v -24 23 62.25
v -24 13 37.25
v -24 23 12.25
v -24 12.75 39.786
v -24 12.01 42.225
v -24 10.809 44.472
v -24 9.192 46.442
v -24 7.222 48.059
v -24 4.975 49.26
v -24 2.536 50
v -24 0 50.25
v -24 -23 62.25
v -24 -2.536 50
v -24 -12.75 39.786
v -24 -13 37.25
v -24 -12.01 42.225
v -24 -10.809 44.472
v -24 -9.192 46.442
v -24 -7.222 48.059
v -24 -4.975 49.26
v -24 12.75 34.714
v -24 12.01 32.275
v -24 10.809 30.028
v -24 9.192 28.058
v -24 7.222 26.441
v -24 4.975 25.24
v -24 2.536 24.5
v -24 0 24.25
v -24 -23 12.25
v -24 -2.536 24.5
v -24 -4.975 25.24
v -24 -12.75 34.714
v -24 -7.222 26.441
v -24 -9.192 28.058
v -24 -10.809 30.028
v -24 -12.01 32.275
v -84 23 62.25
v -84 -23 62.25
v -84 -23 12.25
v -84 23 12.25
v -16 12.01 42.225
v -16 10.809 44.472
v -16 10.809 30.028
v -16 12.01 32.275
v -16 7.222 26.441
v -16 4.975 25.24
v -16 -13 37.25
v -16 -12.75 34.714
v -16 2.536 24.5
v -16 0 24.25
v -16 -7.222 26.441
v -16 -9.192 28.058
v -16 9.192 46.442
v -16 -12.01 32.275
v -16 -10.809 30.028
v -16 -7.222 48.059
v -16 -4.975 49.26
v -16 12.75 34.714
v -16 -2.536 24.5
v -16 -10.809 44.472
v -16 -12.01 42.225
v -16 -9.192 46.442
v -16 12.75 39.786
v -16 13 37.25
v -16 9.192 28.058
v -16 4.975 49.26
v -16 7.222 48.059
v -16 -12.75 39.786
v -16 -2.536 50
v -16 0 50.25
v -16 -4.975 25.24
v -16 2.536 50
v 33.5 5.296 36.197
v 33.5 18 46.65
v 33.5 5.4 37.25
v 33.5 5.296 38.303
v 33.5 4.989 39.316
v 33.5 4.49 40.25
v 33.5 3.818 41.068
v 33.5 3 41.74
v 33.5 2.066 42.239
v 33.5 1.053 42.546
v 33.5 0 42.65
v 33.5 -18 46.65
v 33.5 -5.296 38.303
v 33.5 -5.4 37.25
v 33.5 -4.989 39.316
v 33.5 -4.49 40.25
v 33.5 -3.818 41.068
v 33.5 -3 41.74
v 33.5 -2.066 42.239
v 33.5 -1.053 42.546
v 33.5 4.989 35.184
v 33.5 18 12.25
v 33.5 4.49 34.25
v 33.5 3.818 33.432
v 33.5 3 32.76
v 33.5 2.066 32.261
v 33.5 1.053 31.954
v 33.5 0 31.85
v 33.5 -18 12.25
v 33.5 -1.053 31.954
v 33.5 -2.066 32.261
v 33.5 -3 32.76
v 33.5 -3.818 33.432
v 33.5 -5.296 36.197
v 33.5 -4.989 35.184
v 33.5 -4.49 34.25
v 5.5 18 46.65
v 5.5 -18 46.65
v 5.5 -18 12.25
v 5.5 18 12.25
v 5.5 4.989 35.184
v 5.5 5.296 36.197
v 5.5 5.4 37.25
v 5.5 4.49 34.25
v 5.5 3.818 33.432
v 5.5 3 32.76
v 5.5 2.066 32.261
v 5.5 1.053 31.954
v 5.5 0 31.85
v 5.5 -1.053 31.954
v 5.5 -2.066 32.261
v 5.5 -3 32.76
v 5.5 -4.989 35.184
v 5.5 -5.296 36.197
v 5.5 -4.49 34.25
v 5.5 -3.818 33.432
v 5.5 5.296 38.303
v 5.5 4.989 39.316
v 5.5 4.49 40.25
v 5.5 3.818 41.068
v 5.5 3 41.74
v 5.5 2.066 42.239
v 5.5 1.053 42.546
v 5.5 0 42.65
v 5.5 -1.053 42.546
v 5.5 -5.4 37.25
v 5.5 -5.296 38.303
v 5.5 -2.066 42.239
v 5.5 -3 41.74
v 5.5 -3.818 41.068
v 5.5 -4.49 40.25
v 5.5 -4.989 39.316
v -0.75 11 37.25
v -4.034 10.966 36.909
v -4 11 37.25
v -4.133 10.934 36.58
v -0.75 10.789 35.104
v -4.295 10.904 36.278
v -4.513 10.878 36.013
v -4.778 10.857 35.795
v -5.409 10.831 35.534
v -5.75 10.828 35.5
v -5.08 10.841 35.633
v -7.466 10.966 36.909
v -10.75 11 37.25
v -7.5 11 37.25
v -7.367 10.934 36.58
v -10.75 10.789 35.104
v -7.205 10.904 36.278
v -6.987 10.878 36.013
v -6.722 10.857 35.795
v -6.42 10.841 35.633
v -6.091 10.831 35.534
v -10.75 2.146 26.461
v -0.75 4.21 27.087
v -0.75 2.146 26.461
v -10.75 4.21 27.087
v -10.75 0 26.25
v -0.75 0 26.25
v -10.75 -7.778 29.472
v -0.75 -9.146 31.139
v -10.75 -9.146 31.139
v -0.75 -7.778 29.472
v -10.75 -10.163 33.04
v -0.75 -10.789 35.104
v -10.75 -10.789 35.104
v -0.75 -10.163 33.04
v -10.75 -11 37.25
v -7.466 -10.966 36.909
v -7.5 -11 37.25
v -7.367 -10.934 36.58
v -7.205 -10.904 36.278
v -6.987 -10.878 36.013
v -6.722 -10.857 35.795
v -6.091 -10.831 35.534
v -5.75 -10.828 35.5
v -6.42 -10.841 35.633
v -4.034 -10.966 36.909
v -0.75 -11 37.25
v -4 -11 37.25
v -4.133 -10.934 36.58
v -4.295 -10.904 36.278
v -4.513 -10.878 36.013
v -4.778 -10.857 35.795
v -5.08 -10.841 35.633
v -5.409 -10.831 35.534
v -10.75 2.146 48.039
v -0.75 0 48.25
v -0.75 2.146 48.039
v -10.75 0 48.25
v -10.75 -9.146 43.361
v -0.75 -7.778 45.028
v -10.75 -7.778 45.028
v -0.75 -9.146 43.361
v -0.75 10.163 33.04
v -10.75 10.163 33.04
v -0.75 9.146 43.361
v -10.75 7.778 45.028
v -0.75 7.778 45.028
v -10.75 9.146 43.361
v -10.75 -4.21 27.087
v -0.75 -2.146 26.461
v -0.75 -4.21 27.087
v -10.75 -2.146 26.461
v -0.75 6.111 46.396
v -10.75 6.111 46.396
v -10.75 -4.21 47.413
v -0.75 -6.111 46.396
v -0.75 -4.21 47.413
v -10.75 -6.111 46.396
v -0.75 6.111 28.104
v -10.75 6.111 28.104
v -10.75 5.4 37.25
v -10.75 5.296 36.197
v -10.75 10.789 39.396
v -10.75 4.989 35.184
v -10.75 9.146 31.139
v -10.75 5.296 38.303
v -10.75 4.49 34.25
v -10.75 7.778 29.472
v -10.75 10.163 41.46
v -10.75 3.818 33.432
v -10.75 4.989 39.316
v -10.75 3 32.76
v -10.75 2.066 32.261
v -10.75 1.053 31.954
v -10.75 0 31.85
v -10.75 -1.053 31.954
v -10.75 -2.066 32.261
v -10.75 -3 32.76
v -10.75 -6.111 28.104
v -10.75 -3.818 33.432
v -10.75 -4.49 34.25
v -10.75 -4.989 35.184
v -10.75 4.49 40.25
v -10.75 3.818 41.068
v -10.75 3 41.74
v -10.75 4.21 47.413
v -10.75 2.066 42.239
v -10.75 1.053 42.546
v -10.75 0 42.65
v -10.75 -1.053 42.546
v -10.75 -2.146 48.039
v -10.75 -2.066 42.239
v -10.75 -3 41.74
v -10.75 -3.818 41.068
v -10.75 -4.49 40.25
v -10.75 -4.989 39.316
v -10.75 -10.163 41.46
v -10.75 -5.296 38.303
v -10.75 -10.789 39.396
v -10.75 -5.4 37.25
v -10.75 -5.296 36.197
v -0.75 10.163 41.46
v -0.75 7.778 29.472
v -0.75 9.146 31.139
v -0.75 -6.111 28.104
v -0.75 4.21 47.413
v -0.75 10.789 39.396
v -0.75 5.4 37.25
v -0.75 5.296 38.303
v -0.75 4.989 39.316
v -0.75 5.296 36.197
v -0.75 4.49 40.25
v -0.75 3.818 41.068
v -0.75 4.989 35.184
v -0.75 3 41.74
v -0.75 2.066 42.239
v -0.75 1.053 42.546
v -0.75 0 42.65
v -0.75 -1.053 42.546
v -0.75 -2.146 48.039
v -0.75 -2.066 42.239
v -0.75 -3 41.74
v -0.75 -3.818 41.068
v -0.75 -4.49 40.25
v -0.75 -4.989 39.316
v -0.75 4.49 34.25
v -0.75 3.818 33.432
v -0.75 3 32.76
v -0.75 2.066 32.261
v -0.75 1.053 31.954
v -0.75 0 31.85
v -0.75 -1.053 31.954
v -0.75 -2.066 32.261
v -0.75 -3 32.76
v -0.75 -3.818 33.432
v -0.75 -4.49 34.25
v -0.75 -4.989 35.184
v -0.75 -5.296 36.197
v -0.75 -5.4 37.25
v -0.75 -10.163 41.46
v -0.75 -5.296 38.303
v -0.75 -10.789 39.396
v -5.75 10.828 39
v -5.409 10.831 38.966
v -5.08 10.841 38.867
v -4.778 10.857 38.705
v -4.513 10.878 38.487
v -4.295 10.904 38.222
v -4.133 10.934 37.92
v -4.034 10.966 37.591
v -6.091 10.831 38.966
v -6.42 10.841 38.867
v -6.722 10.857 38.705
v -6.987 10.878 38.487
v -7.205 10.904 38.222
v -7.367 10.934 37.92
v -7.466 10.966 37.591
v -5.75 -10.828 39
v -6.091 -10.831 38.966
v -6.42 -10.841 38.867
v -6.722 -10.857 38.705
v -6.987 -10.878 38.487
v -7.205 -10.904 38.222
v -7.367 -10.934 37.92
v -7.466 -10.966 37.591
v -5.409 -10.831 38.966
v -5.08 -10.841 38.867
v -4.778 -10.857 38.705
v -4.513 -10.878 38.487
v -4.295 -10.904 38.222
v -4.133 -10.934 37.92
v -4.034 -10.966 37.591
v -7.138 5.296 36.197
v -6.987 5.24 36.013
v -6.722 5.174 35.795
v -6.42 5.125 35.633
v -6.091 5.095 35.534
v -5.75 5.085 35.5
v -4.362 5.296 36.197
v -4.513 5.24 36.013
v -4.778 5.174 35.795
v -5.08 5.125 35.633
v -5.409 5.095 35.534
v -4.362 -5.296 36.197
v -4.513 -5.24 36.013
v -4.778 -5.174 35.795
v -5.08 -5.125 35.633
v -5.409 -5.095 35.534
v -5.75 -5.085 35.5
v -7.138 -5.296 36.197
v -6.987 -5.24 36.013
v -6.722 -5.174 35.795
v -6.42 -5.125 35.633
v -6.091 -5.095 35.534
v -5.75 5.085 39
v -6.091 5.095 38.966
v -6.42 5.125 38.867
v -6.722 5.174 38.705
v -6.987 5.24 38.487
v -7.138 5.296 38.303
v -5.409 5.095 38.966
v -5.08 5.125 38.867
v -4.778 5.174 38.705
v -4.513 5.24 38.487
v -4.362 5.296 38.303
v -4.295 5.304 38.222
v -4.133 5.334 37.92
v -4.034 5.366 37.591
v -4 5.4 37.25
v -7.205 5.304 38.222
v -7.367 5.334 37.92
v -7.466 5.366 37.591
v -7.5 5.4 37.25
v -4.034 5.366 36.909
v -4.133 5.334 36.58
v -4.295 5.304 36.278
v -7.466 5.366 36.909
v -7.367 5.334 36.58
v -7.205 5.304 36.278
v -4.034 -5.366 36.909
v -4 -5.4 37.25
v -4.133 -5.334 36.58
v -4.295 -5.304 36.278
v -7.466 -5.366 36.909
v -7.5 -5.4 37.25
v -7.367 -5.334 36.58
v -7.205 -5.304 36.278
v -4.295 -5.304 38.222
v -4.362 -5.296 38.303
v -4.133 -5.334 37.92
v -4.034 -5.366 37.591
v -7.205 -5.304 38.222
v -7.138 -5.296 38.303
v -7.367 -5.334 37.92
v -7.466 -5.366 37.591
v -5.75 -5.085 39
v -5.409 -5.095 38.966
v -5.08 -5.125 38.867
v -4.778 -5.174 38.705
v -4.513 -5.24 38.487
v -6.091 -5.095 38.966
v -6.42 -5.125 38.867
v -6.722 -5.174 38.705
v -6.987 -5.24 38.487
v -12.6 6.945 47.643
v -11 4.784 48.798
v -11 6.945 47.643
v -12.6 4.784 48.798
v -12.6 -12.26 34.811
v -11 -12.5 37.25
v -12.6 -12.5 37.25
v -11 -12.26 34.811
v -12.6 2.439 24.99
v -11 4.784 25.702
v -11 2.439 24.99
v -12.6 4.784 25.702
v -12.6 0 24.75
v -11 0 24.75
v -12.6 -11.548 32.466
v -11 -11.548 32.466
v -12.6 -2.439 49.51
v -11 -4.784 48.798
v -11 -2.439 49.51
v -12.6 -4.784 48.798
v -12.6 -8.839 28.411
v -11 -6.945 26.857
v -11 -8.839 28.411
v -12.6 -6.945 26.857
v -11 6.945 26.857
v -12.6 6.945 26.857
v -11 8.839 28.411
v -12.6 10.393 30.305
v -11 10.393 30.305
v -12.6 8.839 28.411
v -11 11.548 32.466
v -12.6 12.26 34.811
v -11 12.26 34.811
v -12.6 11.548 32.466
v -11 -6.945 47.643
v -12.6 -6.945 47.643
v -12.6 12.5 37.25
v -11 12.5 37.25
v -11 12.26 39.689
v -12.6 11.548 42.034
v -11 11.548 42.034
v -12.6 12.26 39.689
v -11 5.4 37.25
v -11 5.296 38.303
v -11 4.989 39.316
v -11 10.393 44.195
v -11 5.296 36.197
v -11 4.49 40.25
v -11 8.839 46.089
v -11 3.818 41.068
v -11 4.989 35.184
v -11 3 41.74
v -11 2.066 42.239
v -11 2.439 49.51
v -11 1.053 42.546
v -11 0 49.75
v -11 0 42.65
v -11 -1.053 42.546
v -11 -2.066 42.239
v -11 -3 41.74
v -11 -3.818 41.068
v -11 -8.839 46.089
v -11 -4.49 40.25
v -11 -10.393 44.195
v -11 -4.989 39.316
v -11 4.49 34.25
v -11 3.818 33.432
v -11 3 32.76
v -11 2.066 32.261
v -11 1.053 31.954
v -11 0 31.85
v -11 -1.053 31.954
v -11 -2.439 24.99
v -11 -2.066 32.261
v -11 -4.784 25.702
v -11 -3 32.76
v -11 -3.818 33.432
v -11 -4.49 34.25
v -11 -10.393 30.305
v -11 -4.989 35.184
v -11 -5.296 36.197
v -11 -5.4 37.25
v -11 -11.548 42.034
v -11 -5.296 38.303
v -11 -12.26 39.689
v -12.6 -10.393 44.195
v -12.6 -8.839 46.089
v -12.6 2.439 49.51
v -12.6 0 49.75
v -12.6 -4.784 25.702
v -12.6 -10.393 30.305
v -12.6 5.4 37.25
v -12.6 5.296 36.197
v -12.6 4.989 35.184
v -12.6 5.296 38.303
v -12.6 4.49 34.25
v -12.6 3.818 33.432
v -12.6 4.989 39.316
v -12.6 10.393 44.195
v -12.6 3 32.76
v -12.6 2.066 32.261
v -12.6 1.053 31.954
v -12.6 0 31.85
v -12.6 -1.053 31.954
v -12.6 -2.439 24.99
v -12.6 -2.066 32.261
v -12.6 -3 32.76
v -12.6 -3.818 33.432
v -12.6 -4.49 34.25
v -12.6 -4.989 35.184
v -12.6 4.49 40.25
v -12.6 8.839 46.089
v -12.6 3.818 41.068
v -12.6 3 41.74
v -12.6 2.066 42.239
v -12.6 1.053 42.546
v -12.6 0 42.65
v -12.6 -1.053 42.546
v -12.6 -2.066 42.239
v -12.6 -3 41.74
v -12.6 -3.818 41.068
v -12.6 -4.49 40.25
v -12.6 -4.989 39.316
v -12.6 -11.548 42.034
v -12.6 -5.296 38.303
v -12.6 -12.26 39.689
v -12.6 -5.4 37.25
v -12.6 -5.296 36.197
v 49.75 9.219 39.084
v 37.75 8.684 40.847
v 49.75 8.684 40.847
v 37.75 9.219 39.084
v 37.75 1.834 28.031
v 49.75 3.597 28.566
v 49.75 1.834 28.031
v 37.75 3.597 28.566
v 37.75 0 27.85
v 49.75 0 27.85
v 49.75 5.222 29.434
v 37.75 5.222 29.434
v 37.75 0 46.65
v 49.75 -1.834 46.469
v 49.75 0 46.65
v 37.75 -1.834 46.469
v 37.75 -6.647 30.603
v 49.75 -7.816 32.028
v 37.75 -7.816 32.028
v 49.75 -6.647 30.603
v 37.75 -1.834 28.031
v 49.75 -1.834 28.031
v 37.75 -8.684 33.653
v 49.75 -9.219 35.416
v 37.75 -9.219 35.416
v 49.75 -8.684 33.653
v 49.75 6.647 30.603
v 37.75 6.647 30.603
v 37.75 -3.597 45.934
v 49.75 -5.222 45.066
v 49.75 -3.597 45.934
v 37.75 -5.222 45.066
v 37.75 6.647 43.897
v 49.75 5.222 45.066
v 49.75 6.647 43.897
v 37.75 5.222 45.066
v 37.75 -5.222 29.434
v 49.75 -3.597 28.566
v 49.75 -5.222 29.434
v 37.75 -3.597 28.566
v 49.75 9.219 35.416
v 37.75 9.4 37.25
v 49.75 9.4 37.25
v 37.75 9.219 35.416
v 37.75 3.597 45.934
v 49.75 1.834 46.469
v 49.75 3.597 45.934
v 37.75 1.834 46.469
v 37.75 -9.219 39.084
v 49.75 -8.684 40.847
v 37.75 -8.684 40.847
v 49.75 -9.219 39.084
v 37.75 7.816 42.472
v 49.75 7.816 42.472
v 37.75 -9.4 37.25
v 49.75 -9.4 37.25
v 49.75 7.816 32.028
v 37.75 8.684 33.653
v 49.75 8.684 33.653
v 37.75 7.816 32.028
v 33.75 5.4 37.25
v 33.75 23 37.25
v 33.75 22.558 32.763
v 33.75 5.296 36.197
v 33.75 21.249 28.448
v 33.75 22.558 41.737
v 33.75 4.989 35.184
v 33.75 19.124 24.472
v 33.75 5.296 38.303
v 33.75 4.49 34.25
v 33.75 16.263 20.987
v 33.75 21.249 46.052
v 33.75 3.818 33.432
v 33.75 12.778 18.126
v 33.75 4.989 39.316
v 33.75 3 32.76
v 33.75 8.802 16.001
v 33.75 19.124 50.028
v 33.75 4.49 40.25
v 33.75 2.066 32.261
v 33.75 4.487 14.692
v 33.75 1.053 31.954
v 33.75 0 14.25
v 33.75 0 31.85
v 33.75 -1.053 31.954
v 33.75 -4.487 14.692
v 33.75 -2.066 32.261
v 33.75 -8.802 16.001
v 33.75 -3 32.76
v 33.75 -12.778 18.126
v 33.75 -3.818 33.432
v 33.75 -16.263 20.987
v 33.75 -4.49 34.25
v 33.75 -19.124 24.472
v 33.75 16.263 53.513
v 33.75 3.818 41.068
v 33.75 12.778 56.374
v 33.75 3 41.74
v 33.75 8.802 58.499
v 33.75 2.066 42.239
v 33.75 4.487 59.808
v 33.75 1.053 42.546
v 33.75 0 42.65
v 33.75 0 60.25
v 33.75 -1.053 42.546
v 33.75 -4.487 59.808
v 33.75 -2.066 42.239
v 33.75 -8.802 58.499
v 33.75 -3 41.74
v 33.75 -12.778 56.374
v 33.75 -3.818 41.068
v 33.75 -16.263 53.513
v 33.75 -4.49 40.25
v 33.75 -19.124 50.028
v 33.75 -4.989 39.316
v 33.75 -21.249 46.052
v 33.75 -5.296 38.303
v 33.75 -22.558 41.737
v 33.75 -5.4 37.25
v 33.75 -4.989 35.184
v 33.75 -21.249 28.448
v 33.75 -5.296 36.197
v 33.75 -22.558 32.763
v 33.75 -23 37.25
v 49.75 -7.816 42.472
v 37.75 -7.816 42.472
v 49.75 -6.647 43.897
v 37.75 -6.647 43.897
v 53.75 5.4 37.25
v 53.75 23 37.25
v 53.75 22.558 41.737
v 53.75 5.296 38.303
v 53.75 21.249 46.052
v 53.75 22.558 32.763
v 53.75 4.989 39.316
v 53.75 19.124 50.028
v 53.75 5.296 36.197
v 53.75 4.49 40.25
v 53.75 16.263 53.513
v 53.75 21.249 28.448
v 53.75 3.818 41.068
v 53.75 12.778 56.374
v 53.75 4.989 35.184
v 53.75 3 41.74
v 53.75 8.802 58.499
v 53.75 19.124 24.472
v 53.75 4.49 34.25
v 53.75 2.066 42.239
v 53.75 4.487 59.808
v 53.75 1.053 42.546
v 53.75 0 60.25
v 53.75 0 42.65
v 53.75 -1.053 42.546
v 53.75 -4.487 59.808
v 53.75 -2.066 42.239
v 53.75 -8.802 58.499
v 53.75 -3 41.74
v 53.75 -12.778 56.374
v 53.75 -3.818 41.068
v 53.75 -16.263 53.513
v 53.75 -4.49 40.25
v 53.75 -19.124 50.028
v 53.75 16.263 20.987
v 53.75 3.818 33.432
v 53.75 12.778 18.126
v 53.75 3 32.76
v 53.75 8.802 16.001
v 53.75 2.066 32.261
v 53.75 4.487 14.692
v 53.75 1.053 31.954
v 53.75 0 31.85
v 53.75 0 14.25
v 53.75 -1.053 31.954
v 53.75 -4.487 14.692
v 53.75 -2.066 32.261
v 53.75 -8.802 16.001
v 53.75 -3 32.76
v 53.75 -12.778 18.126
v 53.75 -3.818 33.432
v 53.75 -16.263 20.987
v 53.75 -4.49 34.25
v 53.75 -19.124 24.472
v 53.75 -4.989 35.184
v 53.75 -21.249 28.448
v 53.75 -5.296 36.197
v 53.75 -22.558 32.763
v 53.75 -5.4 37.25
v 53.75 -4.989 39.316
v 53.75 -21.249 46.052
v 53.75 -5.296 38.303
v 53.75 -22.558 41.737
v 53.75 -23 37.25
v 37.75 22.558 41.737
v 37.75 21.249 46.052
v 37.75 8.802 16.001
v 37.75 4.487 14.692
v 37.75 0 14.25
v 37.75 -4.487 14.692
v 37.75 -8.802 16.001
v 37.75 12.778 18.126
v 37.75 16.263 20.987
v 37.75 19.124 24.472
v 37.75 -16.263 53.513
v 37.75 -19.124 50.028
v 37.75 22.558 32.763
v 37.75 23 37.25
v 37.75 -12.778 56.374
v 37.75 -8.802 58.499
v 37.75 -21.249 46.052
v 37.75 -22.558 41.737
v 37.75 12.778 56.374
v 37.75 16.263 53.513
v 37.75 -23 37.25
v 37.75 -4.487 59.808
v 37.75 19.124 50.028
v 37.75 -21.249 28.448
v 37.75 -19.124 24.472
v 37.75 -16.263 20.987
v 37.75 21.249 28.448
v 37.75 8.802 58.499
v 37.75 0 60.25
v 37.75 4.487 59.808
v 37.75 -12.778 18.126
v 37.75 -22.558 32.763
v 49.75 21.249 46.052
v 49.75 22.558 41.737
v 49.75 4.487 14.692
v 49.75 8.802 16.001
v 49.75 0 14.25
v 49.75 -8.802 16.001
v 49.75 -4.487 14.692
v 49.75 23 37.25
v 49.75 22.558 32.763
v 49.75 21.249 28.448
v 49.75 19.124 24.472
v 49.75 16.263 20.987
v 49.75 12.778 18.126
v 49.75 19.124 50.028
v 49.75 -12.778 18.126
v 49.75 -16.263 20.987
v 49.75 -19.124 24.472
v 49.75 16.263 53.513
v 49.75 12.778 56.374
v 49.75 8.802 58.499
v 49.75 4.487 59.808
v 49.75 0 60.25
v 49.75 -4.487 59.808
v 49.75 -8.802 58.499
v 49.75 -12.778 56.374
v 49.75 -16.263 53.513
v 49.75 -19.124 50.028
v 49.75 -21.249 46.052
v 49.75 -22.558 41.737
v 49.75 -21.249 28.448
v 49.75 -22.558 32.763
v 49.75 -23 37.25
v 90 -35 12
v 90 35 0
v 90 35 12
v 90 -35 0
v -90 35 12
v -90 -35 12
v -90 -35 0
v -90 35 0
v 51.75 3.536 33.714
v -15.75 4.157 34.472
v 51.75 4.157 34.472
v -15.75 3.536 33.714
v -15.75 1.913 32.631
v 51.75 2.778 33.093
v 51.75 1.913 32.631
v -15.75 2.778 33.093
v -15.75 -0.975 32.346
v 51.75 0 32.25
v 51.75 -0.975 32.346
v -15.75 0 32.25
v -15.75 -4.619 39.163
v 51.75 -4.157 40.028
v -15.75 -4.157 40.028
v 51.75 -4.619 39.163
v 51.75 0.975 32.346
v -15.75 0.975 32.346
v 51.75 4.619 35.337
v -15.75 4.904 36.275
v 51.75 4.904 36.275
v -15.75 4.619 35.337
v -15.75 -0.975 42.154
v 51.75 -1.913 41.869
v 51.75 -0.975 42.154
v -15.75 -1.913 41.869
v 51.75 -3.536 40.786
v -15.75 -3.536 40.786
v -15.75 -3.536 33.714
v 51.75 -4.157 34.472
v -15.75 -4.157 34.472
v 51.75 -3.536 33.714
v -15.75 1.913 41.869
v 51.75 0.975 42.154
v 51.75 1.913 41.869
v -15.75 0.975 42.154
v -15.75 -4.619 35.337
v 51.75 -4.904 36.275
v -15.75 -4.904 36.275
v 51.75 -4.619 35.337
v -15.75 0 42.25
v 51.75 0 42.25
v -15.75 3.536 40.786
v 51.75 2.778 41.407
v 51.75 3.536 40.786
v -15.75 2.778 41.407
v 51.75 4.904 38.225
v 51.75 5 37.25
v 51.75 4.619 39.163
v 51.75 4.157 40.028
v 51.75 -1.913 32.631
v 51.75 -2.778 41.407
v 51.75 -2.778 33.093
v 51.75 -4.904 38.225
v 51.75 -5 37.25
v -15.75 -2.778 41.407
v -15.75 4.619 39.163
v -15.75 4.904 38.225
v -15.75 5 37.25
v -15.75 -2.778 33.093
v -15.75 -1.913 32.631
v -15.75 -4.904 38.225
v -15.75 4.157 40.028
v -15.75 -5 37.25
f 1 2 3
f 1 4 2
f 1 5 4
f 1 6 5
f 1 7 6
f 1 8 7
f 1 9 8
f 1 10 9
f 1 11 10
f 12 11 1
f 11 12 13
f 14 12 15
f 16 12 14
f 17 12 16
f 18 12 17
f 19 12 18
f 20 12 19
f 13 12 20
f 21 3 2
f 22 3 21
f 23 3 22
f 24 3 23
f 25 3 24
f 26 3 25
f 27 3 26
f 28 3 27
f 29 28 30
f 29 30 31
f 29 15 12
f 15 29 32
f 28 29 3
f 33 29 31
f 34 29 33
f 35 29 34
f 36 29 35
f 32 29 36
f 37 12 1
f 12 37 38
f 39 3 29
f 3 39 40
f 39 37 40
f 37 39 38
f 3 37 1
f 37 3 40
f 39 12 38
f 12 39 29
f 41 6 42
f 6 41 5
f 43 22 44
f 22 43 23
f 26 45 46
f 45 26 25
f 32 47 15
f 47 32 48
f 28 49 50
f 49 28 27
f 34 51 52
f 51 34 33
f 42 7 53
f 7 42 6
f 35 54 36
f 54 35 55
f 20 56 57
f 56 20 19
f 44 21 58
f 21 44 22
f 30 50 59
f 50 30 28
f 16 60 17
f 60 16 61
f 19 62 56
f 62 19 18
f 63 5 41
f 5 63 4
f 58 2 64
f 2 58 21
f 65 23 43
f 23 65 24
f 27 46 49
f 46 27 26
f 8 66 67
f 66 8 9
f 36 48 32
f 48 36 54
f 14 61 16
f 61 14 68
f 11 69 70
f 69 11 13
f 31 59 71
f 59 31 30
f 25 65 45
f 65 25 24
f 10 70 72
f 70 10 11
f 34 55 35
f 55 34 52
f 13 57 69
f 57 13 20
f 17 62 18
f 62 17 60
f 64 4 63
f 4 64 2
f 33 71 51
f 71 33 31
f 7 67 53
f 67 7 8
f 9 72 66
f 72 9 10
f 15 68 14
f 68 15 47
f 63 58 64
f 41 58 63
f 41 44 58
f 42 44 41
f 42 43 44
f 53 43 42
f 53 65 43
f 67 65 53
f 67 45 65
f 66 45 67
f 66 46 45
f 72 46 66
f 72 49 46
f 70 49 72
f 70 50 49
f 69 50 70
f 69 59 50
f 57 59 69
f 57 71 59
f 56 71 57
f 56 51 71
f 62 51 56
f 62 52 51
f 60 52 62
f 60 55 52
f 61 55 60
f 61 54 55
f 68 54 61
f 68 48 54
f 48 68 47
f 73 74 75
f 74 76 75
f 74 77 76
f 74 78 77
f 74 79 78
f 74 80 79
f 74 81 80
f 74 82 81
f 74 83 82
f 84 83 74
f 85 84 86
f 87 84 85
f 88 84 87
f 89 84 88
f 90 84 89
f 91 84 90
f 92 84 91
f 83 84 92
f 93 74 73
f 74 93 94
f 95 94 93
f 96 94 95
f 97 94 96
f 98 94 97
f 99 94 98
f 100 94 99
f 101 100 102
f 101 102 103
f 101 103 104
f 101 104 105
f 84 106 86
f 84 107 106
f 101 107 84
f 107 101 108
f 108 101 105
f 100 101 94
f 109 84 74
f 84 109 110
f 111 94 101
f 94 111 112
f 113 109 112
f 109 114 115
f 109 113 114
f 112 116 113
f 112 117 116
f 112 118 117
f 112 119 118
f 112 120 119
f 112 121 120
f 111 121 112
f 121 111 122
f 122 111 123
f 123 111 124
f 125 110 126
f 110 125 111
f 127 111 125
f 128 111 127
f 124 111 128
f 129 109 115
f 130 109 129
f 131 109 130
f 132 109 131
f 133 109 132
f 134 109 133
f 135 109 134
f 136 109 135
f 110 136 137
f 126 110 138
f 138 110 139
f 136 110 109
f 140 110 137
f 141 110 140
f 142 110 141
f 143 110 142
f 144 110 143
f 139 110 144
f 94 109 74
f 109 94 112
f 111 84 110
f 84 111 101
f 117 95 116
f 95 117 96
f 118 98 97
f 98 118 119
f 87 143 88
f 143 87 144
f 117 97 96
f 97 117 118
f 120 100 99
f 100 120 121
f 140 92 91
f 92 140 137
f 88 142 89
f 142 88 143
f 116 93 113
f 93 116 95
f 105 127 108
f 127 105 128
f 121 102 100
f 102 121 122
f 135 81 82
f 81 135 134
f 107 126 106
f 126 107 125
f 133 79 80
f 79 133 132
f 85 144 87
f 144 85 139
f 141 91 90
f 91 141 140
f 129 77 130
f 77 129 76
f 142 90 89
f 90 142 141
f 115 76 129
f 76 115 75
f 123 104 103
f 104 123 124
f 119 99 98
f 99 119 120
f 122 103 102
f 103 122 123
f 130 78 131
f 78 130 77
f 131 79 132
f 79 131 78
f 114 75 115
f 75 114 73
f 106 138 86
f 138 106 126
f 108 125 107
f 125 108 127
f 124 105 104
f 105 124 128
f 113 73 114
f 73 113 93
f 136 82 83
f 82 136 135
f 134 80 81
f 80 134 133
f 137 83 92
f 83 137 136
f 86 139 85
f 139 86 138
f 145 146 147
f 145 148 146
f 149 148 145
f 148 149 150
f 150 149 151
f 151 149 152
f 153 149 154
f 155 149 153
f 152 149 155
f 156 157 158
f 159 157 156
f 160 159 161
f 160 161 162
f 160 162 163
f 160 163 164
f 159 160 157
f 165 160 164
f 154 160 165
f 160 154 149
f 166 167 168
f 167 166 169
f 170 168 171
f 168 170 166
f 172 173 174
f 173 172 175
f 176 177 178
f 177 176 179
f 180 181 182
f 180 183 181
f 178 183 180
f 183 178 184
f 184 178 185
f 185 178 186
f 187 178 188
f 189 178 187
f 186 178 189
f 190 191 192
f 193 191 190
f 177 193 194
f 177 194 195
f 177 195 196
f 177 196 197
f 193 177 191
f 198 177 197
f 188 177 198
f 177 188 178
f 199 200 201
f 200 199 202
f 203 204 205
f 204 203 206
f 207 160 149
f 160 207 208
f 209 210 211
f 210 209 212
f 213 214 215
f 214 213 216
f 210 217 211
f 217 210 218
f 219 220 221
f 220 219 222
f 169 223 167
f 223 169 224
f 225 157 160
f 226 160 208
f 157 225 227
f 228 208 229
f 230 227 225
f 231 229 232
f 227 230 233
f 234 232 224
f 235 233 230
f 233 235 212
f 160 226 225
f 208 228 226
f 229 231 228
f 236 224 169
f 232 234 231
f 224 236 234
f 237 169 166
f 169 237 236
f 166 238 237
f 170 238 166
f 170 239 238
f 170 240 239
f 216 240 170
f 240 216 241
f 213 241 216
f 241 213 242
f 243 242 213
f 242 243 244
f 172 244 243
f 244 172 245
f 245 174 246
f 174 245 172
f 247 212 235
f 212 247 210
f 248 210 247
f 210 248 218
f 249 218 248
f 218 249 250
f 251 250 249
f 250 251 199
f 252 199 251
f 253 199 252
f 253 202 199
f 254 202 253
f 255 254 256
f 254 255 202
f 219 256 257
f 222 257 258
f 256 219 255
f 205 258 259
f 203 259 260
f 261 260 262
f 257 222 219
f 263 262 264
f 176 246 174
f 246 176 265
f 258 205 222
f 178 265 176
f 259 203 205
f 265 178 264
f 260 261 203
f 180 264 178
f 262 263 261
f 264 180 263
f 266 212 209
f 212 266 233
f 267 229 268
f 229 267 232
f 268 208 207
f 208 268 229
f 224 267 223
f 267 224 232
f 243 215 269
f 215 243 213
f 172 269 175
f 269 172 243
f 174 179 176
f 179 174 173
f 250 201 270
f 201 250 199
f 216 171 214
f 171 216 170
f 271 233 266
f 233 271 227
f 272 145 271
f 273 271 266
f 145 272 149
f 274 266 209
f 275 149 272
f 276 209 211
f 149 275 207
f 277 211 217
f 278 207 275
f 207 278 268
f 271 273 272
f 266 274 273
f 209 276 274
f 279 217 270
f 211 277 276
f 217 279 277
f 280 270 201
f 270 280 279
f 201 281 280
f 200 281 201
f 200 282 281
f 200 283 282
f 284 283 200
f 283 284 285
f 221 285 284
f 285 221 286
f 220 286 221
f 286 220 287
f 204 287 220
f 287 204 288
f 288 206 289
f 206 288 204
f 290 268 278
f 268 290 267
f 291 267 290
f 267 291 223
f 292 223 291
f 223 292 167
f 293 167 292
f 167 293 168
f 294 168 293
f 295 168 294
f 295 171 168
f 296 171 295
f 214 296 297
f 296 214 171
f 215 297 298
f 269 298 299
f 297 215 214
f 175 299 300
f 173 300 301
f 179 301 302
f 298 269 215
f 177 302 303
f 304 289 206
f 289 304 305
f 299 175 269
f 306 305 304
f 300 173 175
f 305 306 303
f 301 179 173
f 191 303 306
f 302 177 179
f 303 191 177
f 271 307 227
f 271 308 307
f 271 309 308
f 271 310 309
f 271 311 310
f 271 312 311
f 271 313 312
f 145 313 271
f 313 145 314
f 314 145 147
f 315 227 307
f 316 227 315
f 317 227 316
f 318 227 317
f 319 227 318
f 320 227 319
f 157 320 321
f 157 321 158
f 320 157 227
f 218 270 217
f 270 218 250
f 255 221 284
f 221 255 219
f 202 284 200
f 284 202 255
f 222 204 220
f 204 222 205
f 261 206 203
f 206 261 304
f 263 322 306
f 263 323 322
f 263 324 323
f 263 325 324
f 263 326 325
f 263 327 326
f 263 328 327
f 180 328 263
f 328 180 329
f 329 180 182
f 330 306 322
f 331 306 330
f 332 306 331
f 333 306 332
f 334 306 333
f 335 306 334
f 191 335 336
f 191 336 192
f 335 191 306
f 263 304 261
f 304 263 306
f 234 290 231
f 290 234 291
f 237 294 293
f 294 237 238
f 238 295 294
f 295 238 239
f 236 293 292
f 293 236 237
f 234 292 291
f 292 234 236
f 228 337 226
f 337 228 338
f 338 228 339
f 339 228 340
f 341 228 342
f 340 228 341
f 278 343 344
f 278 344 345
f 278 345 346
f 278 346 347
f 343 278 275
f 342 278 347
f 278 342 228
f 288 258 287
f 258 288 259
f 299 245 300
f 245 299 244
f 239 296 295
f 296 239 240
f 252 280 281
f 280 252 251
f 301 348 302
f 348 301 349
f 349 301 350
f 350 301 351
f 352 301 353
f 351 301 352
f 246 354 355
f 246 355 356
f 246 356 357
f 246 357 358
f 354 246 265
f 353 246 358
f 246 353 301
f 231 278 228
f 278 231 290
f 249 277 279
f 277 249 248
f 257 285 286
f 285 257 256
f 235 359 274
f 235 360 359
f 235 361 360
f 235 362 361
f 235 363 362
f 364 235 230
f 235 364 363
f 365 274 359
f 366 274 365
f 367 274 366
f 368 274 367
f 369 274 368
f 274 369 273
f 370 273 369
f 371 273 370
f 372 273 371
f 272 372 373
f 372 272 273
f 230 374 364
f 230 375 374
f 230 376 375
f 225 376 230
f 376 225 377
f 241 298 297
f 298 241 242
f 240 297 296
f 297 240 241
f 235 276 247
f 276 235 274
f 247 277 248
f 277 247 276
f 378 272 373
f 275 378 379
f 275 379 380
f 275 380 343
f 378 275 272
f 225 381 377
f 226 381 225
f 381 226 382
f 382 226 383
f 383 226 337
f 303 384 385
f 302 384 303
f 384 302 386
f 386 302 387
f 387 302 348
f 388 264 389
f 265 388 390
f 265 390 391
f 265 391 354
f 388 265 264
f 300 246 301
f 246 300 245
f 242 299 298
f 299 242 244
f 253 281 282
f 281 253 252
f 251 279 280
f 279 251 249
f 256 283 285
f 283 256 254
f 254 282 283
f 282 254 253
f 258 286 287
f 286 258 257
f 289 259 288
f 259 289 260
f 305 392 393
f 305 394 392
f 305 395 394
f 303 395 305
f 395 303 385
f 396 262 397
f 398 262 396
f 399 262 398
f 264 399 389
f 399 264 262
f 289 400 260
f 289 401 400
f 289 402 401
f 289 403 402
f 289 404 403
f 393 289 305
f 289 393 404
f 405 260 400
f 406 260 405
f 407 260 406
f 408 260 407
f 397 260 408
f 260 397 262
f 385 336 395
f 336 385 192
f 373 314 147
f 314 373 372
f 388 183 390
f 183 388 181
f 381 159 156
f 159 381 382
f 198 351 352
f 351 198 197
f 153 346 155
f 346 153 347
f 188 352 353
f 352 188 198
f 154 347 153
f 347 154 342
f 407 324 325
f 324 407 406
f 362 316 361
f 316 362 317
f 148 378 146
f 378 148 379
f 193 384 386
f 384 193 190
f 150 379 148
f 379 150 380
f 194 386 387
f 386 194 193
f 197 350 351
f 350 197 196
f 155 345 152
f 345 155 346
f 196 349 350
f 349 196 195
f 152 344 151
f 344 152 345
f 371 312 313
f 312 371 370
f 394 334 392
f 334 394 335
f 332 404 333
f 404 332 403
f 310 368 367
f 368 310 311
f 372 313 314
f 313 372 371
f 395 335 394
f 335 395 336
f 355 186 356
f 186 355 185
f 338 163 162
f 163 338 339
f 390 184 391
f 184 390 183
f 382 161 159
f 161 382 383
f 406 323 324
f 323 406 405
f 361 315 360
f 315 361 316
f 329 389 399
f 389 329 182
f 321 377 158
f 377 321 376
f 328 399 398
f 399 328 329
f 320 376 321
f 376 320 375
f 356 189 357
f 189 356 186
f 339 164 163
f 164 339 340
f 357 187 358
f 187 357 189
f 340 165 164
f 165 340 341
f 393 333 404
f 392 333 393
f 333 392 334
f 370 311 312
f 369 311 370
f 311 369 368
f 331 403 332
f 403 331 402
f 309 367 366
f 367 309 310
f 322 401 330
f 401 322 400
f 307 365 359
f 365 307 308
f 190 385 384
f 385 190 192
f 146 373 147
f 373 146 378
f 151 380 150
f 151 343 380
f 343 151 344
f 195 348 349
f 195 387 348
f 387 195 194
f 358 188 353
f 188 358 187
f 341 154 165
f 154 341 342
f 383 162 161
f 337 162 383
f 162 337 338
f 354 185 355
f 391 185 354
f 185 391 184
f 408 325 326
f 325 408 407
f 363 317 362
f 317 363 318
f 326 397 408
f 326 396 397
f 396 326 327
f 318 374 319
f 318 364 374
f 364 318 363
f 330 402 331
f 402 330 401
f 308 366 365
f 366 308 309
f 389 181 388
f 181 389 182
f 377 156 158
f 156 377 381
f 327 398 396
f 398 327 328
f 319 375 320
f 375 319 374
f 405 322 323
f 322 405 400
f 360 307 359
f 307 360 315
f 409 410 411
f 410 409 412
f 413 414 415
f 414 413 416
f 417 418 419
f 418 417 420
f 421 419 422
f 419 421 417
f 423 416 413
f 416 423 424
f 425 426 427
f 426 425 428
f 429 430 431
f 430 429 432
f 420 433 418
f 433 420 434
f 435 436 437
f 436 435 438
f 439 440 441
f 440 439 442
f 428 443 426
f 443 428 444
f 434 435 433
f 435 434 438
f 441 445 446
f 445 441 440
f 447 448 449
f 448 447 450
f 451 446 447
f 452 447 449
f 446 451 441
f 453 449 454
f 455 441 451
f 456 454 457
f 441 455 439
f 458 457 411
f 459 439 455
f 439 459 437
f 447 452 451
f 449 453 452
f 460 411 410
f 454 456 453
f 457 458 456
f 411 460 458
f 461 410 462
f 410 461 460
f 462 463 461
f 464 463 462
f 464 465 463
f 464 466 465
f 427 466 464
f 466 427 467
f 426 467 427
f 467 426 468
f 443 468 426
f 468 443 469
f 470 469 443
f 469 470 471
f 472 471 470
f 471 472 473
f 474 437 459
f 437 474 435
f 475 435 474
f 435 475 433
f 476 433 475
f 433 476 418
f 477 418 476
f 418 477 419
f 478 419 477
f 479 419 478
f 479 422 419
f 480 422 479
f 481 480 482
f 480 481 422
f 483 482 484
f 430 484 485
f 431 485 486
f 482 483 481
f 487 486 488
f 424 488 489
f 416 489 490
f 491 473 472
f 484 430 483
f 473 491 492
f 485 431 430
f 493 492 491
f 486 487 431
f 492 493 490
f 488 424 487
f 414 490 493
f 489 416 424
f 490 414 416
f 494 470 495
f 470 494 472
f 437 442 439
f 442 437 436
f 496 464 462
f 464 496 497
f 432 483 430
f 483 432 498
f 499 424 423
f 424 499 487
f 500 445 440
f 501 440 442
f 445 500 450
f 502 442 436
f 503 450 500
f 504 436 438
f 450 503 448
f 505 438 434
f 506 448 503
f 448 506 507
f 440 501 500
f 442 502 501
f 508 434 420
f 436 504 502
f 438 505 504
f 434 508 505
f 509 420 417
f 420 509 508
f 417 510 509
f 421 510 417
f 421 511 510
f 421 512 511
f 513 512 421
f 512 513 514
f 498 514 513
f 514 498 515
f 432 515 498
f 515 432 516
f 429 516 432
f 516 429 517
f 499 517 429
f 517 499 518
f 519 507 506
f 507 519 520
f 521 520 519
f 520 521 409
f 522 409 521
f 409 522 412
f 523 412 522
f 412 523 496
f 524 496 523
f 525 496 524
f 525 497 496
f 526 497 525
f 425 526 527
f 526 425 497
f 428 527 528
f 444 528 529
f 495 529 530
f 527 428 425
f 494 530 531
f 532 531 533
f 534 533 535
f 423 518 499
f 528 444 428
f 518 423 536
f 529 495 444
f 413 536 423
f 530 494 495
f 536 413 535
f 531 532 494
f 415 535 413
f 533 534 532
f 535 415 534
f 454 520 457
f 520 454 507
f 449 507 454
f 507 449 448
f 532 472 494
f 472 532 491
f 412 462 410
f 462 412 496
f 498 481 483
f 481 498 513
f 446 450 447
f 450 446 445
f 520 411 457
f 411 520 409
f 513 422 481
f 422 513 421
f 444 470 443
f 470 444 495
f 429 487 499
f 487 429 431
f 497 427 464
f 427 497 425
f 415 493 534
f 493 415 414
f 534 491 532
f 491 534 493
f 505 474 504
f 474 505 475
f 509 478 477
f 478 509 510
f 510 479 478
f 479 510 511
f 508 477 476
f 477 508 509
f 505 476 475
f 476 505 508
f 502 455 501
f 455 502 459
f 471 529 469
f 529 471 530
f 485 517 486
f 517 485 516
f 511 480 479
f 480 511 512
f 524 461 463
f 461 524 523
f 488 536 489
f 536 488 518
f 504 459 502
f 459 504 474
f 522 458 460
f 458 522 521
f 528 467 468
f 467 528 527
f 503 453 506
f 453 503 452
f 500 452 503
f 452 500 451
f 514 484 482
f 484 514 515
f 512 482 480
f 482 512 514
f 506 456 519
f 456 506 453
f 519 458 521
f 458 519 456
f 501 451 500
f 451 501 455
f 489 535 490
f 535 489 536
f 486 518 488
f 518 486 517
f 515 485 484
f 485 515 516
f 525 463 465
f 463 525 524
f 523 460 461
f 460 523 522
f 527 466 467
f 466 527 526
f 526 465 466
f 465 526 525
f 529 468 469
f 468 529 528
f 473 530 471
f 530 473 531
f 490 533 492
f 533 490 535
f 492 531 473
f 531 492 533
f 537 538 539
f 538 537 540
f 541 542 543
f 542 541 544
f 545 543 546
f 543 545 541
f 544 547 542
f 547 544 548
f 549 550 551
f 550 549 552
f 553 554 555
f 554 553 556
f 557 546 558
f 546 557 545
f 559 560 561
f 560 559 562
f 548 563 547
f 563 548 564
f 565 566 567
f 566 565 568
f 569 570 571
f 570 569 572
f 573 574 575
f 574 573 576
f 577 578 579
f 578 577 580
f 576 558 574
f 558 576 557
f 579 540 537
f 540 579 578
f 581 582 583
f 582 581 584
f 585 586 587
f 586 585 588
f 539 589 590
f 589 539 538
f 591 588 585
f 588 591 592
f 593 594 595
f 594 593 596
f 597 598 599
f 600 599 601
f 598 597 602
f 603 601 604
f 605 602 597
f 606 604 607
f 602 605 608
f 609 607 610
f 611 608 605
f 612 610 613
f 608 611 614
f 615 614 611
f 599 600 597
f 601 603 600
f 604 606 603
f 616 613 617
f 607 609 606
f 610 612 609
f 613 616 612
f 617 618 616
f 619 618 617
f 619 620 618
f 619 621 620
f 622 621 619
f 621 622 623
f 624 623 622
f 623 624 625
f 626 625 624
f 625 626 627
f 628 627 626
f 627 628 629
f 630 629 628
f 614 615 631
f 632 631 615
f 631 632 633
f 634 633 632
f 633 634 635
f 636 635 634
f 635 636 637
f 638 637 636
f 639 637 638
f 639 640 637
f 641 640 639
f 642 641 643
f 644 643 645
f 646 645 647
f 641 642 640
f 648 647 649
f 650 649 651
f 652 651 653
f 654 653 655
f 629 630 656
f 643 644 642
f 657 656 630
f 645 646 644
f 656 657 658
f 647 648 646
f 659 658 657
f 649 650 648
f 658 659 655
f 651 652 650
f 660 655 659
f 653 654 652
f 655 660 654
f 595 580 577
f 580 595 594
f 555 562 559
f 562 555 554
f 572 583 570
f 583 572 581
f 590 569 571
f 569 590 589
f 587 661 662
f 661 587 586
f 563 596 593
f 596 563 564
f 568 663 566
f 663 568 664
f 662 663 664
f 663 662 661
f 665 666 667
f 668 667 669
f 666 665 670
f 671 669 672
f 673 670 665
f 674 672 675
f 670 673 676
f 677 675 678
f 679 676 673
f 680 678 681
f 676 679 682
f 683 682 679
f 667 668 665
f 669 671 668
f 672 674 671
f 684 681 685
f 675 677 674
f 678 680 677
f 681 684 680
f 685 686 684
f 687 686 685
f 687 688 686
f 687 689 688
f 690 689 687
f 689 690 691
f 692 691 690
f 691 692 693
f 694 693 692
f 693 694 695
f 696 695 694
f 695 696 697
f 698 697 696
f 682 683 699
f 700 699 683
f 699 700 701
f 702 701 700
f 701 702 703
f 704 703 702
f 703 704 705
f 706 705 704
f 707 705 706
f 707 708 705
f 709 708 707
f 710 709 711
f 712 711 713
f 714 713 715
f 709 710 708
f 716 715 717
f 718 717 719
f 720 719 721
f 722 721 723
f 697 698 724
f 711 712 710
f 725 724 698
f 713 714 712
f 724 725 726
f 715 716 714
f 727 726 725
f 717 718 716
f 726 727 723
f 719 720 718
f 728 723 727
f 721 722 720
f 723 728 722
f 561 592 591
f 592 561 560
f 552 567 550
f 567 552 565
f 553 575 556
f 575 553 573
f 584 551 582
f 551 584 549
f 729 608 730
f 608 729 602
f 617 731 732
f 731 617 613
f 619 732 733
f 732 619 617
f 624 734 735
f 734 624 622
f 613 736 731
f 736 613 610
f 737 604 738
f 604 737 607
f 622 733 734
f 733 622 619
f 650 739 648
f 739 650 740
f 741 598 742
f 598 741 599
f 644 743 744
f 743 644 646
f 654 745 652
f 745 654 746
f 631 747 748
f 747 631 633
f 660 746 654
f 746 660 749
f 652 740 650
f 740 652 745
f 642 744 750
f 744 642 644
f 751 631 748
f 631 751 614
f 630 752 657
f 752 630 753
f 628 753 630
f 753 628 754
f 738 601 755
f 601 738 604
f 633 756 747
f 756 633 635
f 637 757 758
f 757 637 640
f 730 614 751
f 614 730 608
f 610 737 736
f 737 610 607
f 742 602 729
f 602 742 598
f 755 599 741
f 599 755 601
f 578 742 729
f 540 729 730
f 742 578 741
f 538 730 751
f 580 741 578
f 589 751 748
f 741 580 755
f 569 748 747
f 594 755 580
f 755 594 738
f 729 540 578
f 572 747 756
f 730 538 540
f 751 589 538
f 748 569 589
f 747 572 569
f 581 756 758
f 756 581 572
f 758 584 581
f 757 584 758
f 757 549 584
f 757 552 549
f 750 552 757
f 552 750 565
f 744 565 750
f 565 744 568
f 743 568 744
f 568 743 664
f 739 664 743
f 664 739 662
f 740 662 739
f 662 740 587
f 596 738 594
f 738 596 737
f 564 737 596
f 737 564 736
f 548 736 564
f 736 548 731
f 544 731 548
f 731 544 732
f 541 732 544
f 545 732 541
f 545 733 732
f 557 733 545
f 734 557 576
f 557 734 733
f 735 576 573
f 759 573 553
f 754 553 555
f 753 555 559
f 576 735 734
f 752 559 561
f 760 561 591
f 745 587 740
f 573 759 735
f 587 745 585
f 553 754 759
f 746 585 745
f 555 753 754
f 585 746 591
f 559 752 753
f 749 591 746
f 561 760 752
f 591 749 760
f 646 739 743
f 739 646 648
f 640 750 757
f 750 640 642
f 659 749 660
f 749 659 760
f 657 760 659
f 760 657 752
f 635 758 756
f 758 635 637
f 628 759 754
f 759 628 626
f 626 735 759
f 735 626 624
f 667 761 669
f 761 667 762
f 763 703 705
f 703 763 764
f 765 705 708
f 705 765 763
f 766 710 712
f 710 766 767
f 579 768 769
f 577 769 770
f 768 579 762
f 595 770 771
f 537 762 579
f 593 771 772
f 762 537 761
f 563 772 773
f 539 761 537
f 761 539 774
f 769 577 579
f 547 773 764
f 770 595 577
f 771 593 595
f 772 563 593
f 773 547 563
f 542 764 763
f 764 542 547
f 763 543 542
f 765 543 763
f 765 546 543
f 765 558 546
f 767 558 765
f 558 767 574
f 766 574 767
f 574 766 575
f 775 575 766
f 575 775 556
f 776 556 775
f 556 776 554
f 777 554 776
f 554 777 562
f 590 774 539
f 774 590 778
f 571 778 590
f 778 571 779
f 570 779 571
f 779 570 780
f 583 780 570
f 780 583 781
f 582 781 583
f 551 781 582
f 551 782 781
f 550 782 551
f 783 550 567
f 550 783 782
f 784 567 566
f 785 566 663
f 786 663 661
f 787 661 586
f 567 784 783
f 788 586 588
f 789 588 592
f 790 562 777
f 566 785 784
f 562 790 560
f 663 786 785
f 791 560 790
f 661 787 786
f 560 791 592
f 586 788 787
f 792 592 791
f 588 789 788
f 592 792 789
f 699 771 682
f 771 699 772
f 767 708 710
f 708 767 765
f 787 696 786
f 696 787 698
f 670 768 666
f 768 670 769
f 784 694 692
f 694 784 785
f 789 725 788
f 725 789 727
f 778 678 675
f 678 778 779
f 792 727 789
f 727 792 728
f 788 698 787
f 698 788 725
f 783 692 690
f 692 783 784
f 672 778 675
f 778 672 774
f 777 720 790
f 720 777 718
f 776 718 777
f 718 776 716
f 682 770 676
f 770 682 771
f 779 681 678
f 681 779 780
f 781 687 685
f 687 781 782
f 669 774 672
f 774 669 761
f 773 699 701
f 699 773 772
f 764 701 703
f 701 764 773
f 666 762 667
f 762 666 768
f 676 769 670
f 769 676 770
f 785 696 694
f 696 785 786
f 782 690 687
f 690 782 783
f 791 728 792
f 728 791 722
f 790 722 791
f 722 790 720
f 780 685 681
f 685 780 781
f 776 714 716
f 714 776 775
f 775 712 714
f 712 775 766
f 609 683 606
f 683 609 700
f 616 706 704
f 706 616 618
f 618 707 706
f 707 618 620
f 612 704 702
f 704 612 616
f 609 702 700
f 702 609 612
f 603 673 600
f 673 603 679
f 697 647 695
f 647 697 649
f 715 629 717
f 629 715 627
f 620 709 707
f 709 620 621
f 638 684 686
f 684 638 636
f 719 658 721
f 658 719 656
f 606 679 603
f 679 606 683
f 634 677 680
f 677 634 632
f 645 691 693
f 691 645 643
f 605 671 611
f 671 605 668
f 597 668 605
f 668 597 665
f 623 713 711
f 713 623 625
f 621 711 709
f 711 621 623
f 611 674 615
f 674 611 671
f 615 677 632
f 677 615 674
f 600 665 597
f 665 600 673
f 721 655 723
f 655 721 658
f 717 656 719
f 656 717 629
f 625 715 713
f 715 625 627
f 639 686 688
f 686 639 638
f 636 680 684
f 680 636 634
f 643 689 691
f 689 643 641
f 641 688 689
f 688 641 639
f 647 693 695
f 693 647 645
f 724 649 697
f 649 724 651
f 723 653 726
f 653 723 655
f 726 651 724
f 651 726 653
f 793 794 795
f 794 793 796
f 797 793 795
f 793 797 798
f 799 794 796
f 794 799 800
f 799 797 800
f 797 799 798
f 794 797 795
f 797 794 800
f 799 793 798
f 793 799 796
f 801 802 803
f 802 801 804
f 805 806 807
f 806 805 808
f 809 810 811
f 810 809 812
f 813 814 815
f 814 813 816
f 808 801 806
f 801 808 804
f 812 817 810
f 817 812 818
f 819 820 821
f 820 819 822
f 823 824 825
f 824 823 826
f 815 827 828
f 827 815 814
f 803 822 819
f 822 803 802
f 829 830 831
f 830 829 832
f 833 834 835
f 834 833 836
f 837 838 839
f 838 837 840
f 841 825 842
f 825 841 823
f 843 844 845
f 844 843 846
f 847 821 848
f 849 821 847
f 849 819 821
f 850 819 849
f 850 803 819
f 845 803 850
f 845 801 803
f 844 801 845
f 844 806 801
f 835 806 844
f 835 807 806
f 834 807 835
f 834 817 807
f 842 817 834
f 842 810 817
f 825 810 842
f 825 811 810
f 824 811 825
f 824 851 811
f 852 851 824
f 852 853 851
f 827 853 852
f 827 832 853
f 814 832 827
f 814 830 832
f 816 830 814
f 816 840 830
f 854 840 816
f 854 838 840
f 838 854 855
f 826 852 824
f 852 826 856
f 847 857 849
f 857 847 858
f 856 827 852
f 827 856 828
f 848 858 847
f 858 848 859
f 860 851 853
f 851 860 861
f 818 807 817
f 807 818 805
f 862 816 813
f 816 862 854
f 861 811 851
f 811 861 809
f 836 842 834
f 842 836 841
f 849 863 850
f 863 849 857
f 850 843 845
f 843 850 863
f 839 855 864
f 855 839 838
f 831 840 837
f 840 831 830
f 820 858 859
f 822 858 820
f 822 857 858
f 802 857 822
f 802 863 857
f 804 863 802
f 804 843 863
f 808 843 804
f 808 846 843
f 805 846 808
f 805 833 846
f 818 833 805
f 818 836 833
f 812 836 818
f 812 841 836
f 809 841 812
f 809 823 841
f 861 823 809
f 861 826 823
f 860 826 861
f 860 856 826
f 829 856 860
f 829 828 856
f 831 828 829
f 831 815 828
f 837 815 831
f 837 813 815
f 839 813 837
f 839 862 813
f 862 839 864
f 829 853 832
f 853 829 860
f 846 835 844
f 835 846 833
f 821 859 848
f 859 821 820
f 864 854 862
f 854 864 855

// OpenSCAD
$fn = 32;

// ------------------------------------------------------------------------
// Motor drive station: motor 60 x 50 mm, shaft d10, pulley d46
// Every part is its own module, assembly() places every instance.
// ------------------------------------------------------------------------

// --- part 1 ---
module station_bed() {
  difference() {
    translate([-90, -35, 0]) cube([180, 70, 12]);
  }
}

// --- part 2 ---
module drive_motor() {
  union() {
    translate([-30, -23, 0]) cube([60, 46, 50]);
    translate([34, 0, 25]) rotate([0, 90, 0]) cylinder(h = 8, d = 26, center = true);
  }
}

// --- part 3 ---
module pillow_block() {
  difference() {
    translate([-14, -18, 0]) cube([28, 36, 34.4]);
    translate([0, 0, 25]) rotate([0, 90, 0]) cylinder(h = 30, d = 10.8, center = true);
  }
}

// --- part 4 ---
module drive_shaft() {
  translate([0, 0, -33.75]) cylinder(h = 67.5, d = 10);
}

// --- part 5 ---
module shaft_collar() {
  difference() {
    cylinder(h = 10, d = 22);
    translate([0, 0, -1]) cylinder(h = 12, d = 10.8);
    translate([0, 0, 5]) rotate([90, 0, 0]) cylinder(h = 24, d = 3.5, center = true);
  }
}

// --- part 6 ---
module collar_washer() {
  difference() {
      translate([0, 0, 0]) cylinder(h = 1.6, d = 25);
      translate([0, 0, -1]) cylinder(h = 3.6, d = 10.8);
    }
}

// --- part 7 ---
module drive_pulley() {
  difference() {
    union() {
      cylinder(h = 20, d = 18.8);
      cylinder(h = 4, d = 46);
      translate([0, 0, 16]) cylinder(h = 4, d = 46);
    }
    translate([0, 0, -1]) cylinder(h = 22, d = 10.8);
  }
}

// --- assembly ---
module assembly() {
  color([0.80, 0.24, 0.20]) translate([0, 0, 0]) rotate([0, 0, 0]) station_bed();
  color([0.20, 0.45, 0.75]) translate([-54, 0, 12.25]) rotate([0, 0, 0]) drive_motor();
  color([0.25, 0.62, 0.32]) translate([19.5, 0, 12.25]) rotate([0, 0, 0]) pillow_block();
  color([0.92, 0.70, 0.18]) translate([18, 0, 37.25]) rotate([0, 90, 0]) drive_shaft();
  color([0.58, 0.35, 0.70]) translate([-10.75, 0, 37.25]) rotate([0, 90, 0]) shaft_collar();
  color([0.16, 0.66, 0.66]) translate([-12.6, 0, 37.25]) rotate([0, 90, 0]) collar_washer();
  color([0.85, 0.48, 0.18]) translate([33.75, 0, 37.25]) rotate([0, 90, 0]) drive_pulley();
}

assembly();
